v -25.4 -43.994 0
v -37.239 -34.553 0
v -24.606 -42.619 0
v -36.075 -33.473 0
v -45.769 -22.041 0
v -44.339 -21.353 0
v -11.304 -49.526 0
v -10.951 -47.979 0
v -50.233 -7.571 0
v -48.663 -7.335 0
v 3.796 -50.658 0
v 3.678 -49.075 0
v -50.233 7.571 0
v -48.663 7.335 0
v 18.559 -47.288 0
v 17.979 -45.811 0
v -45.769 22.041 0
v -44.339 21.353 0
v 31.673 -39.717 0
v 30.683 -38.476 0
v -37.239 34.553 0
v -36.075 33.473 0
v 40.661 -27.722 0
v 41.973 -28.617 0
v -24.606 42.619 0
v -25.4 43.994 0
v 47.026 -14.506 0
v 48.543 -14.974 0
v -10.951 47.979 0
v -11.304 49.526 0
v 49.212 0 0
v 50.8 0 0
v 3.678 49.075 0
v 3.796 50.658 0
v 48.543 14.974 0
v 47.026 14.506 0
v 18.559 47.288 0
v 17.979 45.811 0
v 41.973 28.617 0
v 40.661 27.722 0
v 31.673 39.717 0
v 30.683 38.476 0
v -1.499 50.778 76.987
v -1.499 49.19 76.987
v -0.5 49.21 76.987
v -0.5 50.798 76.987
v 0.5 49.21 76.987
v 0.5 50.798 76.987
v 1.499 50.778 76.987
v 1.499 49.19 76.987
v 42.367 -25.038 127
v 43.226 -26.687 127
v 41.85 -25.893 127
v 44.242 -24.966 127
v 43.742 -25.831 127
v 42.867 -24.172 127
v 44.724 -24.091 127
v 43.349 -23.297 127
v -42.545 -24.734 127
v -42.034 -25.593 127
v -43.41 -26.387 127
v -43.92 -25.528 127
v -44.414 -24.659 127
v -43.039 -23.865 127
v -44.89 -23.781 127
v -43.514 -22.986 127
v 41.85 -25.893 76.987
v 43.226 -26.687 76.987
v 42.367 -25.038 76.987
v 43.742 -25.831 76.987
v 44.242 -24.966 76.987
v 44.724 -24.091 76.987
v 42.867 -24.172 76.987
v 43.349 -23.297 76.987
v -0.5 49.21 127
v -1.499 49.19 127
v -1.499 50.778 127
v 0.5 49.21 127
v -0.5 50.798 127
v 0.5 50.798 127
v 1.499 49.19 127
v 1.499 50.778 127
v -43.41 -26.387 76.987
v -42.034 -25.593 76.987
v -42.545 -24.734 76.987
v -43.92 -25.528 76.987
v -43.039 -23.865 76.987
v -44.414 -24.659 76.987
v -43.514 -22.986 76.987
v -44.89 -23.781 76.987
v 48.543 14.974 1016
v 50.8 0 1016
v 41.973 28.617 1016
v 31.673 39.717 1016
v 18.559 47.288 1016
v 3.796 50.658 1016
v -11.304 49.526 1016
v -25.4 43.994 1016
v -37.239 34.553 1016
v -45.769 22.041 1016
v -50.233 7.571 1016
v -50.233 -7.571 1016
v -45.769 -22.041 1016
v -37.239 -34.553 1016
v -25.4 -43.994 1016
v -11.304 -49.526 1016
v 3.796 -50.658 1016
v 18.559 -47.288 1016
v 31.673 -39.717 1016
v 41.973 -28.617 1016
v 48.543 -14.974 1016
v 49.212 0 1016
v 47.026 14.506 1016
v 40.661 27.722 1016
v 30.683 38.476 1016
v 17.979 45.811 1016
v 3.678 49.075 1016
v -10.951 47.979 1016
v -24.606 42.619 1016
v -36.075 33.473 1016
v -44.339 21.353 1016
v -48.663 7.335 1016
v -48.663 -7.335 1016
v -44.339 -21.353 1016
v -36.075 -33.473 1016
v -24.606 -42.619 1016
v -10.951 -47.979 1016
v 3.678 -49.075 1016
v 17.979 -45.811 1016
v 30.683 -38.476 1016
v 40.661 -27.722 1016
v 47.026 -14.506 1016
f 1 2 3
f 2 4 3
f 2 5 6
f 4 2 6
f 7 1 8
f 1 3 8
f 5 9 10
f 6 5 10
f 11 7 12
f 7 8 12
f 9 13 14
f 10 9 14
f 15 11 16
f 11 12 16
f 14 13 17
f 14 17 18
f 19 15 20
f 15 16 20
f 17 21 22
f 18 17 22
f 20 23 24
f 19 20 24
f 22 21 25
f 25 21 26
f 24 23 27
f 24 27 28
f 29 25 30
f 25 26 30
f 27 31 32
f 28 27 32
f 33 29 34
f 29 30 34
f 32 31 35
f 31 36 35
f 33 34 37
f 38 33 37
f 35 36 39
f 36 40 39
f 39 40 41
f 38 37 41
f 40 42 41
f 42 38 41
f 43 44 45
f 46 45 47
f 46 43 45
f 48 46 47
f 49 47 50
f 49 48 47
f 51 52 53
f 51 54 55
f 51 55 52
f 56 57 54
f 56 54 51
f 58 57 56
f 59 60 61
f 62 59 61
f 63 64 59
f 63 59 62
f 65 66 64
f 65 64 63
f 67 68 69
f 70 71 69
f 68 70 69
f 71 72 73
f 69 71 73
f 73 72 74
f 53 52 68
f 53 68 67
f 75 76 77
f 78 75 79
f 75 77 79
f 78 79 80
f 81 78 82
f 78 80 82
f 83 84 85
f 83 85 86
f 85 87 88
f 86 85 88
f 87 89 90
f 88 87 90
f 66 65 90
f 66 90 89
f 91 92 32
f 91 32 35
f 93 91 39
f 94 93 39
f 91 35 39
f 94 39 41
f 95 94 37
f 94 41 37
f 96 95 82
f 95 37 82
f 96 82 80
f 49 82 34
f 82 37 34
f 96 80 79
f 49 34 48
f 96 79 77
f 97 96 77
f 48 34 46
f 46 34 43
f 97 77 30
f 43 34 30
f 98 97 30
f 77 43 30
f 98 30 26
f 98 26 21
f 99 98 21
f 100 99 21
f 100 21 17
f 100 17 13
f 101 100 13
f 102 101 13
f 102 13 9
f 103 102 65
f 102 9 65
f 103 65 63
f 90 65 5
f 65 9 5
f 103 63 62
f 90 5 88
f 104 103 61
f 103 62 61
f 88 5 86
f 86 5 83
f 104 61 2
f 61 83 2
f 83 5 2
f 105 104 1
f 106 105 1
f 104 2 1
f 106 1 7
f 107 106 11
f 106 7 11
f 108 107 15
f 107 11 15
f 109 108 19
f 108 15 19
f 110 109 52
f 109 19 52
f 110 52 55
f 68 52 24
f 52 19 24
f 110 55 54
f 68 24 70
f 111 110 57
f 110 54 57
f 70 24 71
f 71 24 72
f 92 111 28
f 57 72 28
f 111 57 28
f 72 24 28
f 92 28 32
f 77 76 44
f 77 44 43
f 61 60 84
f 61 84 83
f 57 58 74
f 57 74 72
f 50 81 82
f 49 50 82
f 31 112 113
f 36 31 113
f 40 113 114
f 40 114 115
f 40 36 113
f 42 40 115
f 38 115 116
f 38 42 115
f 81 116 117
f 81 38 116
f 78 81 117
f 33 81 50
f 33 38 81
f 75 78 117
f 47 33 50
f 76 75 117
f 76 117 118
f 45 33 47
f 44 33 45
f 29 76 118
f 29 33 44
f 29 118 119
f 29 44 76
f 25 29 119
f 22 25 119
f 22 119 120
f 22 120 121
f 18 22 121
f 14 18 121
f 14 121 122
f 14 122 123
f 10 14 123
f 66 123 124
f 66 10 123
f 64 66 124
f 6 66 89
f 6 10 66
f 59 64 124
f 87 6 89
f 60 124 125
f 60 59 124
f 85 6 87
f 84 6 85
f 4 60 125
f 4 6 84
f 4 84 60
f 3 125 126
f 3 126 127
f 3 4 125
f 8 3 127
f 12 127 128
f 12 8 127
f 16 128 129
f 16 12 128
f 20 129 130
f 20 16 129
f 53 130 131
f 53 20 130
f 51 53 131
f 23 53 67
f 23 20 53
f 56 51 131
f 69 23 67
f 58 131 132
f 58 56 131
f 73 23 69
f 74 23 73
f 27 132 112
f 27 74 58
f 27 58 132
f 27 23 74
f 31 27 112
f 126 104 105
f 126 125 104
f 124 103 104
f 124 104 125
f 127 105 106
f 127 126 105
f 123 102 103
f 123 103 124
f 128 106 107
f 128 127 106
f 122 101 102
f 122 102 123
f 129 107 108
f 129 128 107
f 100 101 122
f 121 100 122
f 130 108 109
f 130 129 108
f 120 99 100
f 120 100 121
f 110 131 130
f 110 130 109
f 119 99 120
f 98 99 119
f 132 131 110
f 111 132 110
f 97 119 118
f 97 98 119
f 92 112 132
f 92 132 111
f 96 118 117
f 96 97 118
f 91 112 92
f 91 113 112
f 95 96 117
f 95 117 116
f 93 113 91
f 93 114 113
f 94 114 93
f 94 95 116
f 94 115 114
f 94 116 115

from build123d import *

# Parameters (mm, degrees)
SKETCH1_R           = 50.8
SKETCH1_R_2         = 49.2125
BOSS_EXTRUDE1_DEPTH = 1016
CUT_EXTRUDE1_START  = 127
SKETCH2_W           = 2.9972
SKETCH2_H           = 38.1
CUT_EXTRUDE1_DEPTH  = 50.0126


with BuildPart() as part:
    # Sketch1 → Boss-Extrude1 (new body)
    with BuildSketch(Plane.XY):
        Circle(SKETCH1_R)
        Circle(SKETCH1_R_2, mode=Mode.SUBTRACT)
    extrude(amount=BOSS_EXTRUDE1_DEPTH)

    # Sketch2 → Cut-Extrude1 (cut)
    with BuildSketch(Plane.XY.offset(CUT_EXTRUDE1_START)):
        Polygon((25.020238518, -16.17587567), (26.518838518, -13.58022433), (59.514406402, -32.63022433), (58.015806402, -35.22587567), align=None)
        with Locations((0, 49.2125)):
            Rectangle(SKETCH2_W, SKETCH2_H)
        Polygon((-26.870791242, -13.37702433), (-25.372191242, -15.97267567), (-58.367759126, -35.02267567), (-59.866359126, -32.42702433), align=None)
    extrude(amount=-CUT_EXTRUDE1_DEPTH, mode=Mode.SUBTRACT)


solid = part.part
